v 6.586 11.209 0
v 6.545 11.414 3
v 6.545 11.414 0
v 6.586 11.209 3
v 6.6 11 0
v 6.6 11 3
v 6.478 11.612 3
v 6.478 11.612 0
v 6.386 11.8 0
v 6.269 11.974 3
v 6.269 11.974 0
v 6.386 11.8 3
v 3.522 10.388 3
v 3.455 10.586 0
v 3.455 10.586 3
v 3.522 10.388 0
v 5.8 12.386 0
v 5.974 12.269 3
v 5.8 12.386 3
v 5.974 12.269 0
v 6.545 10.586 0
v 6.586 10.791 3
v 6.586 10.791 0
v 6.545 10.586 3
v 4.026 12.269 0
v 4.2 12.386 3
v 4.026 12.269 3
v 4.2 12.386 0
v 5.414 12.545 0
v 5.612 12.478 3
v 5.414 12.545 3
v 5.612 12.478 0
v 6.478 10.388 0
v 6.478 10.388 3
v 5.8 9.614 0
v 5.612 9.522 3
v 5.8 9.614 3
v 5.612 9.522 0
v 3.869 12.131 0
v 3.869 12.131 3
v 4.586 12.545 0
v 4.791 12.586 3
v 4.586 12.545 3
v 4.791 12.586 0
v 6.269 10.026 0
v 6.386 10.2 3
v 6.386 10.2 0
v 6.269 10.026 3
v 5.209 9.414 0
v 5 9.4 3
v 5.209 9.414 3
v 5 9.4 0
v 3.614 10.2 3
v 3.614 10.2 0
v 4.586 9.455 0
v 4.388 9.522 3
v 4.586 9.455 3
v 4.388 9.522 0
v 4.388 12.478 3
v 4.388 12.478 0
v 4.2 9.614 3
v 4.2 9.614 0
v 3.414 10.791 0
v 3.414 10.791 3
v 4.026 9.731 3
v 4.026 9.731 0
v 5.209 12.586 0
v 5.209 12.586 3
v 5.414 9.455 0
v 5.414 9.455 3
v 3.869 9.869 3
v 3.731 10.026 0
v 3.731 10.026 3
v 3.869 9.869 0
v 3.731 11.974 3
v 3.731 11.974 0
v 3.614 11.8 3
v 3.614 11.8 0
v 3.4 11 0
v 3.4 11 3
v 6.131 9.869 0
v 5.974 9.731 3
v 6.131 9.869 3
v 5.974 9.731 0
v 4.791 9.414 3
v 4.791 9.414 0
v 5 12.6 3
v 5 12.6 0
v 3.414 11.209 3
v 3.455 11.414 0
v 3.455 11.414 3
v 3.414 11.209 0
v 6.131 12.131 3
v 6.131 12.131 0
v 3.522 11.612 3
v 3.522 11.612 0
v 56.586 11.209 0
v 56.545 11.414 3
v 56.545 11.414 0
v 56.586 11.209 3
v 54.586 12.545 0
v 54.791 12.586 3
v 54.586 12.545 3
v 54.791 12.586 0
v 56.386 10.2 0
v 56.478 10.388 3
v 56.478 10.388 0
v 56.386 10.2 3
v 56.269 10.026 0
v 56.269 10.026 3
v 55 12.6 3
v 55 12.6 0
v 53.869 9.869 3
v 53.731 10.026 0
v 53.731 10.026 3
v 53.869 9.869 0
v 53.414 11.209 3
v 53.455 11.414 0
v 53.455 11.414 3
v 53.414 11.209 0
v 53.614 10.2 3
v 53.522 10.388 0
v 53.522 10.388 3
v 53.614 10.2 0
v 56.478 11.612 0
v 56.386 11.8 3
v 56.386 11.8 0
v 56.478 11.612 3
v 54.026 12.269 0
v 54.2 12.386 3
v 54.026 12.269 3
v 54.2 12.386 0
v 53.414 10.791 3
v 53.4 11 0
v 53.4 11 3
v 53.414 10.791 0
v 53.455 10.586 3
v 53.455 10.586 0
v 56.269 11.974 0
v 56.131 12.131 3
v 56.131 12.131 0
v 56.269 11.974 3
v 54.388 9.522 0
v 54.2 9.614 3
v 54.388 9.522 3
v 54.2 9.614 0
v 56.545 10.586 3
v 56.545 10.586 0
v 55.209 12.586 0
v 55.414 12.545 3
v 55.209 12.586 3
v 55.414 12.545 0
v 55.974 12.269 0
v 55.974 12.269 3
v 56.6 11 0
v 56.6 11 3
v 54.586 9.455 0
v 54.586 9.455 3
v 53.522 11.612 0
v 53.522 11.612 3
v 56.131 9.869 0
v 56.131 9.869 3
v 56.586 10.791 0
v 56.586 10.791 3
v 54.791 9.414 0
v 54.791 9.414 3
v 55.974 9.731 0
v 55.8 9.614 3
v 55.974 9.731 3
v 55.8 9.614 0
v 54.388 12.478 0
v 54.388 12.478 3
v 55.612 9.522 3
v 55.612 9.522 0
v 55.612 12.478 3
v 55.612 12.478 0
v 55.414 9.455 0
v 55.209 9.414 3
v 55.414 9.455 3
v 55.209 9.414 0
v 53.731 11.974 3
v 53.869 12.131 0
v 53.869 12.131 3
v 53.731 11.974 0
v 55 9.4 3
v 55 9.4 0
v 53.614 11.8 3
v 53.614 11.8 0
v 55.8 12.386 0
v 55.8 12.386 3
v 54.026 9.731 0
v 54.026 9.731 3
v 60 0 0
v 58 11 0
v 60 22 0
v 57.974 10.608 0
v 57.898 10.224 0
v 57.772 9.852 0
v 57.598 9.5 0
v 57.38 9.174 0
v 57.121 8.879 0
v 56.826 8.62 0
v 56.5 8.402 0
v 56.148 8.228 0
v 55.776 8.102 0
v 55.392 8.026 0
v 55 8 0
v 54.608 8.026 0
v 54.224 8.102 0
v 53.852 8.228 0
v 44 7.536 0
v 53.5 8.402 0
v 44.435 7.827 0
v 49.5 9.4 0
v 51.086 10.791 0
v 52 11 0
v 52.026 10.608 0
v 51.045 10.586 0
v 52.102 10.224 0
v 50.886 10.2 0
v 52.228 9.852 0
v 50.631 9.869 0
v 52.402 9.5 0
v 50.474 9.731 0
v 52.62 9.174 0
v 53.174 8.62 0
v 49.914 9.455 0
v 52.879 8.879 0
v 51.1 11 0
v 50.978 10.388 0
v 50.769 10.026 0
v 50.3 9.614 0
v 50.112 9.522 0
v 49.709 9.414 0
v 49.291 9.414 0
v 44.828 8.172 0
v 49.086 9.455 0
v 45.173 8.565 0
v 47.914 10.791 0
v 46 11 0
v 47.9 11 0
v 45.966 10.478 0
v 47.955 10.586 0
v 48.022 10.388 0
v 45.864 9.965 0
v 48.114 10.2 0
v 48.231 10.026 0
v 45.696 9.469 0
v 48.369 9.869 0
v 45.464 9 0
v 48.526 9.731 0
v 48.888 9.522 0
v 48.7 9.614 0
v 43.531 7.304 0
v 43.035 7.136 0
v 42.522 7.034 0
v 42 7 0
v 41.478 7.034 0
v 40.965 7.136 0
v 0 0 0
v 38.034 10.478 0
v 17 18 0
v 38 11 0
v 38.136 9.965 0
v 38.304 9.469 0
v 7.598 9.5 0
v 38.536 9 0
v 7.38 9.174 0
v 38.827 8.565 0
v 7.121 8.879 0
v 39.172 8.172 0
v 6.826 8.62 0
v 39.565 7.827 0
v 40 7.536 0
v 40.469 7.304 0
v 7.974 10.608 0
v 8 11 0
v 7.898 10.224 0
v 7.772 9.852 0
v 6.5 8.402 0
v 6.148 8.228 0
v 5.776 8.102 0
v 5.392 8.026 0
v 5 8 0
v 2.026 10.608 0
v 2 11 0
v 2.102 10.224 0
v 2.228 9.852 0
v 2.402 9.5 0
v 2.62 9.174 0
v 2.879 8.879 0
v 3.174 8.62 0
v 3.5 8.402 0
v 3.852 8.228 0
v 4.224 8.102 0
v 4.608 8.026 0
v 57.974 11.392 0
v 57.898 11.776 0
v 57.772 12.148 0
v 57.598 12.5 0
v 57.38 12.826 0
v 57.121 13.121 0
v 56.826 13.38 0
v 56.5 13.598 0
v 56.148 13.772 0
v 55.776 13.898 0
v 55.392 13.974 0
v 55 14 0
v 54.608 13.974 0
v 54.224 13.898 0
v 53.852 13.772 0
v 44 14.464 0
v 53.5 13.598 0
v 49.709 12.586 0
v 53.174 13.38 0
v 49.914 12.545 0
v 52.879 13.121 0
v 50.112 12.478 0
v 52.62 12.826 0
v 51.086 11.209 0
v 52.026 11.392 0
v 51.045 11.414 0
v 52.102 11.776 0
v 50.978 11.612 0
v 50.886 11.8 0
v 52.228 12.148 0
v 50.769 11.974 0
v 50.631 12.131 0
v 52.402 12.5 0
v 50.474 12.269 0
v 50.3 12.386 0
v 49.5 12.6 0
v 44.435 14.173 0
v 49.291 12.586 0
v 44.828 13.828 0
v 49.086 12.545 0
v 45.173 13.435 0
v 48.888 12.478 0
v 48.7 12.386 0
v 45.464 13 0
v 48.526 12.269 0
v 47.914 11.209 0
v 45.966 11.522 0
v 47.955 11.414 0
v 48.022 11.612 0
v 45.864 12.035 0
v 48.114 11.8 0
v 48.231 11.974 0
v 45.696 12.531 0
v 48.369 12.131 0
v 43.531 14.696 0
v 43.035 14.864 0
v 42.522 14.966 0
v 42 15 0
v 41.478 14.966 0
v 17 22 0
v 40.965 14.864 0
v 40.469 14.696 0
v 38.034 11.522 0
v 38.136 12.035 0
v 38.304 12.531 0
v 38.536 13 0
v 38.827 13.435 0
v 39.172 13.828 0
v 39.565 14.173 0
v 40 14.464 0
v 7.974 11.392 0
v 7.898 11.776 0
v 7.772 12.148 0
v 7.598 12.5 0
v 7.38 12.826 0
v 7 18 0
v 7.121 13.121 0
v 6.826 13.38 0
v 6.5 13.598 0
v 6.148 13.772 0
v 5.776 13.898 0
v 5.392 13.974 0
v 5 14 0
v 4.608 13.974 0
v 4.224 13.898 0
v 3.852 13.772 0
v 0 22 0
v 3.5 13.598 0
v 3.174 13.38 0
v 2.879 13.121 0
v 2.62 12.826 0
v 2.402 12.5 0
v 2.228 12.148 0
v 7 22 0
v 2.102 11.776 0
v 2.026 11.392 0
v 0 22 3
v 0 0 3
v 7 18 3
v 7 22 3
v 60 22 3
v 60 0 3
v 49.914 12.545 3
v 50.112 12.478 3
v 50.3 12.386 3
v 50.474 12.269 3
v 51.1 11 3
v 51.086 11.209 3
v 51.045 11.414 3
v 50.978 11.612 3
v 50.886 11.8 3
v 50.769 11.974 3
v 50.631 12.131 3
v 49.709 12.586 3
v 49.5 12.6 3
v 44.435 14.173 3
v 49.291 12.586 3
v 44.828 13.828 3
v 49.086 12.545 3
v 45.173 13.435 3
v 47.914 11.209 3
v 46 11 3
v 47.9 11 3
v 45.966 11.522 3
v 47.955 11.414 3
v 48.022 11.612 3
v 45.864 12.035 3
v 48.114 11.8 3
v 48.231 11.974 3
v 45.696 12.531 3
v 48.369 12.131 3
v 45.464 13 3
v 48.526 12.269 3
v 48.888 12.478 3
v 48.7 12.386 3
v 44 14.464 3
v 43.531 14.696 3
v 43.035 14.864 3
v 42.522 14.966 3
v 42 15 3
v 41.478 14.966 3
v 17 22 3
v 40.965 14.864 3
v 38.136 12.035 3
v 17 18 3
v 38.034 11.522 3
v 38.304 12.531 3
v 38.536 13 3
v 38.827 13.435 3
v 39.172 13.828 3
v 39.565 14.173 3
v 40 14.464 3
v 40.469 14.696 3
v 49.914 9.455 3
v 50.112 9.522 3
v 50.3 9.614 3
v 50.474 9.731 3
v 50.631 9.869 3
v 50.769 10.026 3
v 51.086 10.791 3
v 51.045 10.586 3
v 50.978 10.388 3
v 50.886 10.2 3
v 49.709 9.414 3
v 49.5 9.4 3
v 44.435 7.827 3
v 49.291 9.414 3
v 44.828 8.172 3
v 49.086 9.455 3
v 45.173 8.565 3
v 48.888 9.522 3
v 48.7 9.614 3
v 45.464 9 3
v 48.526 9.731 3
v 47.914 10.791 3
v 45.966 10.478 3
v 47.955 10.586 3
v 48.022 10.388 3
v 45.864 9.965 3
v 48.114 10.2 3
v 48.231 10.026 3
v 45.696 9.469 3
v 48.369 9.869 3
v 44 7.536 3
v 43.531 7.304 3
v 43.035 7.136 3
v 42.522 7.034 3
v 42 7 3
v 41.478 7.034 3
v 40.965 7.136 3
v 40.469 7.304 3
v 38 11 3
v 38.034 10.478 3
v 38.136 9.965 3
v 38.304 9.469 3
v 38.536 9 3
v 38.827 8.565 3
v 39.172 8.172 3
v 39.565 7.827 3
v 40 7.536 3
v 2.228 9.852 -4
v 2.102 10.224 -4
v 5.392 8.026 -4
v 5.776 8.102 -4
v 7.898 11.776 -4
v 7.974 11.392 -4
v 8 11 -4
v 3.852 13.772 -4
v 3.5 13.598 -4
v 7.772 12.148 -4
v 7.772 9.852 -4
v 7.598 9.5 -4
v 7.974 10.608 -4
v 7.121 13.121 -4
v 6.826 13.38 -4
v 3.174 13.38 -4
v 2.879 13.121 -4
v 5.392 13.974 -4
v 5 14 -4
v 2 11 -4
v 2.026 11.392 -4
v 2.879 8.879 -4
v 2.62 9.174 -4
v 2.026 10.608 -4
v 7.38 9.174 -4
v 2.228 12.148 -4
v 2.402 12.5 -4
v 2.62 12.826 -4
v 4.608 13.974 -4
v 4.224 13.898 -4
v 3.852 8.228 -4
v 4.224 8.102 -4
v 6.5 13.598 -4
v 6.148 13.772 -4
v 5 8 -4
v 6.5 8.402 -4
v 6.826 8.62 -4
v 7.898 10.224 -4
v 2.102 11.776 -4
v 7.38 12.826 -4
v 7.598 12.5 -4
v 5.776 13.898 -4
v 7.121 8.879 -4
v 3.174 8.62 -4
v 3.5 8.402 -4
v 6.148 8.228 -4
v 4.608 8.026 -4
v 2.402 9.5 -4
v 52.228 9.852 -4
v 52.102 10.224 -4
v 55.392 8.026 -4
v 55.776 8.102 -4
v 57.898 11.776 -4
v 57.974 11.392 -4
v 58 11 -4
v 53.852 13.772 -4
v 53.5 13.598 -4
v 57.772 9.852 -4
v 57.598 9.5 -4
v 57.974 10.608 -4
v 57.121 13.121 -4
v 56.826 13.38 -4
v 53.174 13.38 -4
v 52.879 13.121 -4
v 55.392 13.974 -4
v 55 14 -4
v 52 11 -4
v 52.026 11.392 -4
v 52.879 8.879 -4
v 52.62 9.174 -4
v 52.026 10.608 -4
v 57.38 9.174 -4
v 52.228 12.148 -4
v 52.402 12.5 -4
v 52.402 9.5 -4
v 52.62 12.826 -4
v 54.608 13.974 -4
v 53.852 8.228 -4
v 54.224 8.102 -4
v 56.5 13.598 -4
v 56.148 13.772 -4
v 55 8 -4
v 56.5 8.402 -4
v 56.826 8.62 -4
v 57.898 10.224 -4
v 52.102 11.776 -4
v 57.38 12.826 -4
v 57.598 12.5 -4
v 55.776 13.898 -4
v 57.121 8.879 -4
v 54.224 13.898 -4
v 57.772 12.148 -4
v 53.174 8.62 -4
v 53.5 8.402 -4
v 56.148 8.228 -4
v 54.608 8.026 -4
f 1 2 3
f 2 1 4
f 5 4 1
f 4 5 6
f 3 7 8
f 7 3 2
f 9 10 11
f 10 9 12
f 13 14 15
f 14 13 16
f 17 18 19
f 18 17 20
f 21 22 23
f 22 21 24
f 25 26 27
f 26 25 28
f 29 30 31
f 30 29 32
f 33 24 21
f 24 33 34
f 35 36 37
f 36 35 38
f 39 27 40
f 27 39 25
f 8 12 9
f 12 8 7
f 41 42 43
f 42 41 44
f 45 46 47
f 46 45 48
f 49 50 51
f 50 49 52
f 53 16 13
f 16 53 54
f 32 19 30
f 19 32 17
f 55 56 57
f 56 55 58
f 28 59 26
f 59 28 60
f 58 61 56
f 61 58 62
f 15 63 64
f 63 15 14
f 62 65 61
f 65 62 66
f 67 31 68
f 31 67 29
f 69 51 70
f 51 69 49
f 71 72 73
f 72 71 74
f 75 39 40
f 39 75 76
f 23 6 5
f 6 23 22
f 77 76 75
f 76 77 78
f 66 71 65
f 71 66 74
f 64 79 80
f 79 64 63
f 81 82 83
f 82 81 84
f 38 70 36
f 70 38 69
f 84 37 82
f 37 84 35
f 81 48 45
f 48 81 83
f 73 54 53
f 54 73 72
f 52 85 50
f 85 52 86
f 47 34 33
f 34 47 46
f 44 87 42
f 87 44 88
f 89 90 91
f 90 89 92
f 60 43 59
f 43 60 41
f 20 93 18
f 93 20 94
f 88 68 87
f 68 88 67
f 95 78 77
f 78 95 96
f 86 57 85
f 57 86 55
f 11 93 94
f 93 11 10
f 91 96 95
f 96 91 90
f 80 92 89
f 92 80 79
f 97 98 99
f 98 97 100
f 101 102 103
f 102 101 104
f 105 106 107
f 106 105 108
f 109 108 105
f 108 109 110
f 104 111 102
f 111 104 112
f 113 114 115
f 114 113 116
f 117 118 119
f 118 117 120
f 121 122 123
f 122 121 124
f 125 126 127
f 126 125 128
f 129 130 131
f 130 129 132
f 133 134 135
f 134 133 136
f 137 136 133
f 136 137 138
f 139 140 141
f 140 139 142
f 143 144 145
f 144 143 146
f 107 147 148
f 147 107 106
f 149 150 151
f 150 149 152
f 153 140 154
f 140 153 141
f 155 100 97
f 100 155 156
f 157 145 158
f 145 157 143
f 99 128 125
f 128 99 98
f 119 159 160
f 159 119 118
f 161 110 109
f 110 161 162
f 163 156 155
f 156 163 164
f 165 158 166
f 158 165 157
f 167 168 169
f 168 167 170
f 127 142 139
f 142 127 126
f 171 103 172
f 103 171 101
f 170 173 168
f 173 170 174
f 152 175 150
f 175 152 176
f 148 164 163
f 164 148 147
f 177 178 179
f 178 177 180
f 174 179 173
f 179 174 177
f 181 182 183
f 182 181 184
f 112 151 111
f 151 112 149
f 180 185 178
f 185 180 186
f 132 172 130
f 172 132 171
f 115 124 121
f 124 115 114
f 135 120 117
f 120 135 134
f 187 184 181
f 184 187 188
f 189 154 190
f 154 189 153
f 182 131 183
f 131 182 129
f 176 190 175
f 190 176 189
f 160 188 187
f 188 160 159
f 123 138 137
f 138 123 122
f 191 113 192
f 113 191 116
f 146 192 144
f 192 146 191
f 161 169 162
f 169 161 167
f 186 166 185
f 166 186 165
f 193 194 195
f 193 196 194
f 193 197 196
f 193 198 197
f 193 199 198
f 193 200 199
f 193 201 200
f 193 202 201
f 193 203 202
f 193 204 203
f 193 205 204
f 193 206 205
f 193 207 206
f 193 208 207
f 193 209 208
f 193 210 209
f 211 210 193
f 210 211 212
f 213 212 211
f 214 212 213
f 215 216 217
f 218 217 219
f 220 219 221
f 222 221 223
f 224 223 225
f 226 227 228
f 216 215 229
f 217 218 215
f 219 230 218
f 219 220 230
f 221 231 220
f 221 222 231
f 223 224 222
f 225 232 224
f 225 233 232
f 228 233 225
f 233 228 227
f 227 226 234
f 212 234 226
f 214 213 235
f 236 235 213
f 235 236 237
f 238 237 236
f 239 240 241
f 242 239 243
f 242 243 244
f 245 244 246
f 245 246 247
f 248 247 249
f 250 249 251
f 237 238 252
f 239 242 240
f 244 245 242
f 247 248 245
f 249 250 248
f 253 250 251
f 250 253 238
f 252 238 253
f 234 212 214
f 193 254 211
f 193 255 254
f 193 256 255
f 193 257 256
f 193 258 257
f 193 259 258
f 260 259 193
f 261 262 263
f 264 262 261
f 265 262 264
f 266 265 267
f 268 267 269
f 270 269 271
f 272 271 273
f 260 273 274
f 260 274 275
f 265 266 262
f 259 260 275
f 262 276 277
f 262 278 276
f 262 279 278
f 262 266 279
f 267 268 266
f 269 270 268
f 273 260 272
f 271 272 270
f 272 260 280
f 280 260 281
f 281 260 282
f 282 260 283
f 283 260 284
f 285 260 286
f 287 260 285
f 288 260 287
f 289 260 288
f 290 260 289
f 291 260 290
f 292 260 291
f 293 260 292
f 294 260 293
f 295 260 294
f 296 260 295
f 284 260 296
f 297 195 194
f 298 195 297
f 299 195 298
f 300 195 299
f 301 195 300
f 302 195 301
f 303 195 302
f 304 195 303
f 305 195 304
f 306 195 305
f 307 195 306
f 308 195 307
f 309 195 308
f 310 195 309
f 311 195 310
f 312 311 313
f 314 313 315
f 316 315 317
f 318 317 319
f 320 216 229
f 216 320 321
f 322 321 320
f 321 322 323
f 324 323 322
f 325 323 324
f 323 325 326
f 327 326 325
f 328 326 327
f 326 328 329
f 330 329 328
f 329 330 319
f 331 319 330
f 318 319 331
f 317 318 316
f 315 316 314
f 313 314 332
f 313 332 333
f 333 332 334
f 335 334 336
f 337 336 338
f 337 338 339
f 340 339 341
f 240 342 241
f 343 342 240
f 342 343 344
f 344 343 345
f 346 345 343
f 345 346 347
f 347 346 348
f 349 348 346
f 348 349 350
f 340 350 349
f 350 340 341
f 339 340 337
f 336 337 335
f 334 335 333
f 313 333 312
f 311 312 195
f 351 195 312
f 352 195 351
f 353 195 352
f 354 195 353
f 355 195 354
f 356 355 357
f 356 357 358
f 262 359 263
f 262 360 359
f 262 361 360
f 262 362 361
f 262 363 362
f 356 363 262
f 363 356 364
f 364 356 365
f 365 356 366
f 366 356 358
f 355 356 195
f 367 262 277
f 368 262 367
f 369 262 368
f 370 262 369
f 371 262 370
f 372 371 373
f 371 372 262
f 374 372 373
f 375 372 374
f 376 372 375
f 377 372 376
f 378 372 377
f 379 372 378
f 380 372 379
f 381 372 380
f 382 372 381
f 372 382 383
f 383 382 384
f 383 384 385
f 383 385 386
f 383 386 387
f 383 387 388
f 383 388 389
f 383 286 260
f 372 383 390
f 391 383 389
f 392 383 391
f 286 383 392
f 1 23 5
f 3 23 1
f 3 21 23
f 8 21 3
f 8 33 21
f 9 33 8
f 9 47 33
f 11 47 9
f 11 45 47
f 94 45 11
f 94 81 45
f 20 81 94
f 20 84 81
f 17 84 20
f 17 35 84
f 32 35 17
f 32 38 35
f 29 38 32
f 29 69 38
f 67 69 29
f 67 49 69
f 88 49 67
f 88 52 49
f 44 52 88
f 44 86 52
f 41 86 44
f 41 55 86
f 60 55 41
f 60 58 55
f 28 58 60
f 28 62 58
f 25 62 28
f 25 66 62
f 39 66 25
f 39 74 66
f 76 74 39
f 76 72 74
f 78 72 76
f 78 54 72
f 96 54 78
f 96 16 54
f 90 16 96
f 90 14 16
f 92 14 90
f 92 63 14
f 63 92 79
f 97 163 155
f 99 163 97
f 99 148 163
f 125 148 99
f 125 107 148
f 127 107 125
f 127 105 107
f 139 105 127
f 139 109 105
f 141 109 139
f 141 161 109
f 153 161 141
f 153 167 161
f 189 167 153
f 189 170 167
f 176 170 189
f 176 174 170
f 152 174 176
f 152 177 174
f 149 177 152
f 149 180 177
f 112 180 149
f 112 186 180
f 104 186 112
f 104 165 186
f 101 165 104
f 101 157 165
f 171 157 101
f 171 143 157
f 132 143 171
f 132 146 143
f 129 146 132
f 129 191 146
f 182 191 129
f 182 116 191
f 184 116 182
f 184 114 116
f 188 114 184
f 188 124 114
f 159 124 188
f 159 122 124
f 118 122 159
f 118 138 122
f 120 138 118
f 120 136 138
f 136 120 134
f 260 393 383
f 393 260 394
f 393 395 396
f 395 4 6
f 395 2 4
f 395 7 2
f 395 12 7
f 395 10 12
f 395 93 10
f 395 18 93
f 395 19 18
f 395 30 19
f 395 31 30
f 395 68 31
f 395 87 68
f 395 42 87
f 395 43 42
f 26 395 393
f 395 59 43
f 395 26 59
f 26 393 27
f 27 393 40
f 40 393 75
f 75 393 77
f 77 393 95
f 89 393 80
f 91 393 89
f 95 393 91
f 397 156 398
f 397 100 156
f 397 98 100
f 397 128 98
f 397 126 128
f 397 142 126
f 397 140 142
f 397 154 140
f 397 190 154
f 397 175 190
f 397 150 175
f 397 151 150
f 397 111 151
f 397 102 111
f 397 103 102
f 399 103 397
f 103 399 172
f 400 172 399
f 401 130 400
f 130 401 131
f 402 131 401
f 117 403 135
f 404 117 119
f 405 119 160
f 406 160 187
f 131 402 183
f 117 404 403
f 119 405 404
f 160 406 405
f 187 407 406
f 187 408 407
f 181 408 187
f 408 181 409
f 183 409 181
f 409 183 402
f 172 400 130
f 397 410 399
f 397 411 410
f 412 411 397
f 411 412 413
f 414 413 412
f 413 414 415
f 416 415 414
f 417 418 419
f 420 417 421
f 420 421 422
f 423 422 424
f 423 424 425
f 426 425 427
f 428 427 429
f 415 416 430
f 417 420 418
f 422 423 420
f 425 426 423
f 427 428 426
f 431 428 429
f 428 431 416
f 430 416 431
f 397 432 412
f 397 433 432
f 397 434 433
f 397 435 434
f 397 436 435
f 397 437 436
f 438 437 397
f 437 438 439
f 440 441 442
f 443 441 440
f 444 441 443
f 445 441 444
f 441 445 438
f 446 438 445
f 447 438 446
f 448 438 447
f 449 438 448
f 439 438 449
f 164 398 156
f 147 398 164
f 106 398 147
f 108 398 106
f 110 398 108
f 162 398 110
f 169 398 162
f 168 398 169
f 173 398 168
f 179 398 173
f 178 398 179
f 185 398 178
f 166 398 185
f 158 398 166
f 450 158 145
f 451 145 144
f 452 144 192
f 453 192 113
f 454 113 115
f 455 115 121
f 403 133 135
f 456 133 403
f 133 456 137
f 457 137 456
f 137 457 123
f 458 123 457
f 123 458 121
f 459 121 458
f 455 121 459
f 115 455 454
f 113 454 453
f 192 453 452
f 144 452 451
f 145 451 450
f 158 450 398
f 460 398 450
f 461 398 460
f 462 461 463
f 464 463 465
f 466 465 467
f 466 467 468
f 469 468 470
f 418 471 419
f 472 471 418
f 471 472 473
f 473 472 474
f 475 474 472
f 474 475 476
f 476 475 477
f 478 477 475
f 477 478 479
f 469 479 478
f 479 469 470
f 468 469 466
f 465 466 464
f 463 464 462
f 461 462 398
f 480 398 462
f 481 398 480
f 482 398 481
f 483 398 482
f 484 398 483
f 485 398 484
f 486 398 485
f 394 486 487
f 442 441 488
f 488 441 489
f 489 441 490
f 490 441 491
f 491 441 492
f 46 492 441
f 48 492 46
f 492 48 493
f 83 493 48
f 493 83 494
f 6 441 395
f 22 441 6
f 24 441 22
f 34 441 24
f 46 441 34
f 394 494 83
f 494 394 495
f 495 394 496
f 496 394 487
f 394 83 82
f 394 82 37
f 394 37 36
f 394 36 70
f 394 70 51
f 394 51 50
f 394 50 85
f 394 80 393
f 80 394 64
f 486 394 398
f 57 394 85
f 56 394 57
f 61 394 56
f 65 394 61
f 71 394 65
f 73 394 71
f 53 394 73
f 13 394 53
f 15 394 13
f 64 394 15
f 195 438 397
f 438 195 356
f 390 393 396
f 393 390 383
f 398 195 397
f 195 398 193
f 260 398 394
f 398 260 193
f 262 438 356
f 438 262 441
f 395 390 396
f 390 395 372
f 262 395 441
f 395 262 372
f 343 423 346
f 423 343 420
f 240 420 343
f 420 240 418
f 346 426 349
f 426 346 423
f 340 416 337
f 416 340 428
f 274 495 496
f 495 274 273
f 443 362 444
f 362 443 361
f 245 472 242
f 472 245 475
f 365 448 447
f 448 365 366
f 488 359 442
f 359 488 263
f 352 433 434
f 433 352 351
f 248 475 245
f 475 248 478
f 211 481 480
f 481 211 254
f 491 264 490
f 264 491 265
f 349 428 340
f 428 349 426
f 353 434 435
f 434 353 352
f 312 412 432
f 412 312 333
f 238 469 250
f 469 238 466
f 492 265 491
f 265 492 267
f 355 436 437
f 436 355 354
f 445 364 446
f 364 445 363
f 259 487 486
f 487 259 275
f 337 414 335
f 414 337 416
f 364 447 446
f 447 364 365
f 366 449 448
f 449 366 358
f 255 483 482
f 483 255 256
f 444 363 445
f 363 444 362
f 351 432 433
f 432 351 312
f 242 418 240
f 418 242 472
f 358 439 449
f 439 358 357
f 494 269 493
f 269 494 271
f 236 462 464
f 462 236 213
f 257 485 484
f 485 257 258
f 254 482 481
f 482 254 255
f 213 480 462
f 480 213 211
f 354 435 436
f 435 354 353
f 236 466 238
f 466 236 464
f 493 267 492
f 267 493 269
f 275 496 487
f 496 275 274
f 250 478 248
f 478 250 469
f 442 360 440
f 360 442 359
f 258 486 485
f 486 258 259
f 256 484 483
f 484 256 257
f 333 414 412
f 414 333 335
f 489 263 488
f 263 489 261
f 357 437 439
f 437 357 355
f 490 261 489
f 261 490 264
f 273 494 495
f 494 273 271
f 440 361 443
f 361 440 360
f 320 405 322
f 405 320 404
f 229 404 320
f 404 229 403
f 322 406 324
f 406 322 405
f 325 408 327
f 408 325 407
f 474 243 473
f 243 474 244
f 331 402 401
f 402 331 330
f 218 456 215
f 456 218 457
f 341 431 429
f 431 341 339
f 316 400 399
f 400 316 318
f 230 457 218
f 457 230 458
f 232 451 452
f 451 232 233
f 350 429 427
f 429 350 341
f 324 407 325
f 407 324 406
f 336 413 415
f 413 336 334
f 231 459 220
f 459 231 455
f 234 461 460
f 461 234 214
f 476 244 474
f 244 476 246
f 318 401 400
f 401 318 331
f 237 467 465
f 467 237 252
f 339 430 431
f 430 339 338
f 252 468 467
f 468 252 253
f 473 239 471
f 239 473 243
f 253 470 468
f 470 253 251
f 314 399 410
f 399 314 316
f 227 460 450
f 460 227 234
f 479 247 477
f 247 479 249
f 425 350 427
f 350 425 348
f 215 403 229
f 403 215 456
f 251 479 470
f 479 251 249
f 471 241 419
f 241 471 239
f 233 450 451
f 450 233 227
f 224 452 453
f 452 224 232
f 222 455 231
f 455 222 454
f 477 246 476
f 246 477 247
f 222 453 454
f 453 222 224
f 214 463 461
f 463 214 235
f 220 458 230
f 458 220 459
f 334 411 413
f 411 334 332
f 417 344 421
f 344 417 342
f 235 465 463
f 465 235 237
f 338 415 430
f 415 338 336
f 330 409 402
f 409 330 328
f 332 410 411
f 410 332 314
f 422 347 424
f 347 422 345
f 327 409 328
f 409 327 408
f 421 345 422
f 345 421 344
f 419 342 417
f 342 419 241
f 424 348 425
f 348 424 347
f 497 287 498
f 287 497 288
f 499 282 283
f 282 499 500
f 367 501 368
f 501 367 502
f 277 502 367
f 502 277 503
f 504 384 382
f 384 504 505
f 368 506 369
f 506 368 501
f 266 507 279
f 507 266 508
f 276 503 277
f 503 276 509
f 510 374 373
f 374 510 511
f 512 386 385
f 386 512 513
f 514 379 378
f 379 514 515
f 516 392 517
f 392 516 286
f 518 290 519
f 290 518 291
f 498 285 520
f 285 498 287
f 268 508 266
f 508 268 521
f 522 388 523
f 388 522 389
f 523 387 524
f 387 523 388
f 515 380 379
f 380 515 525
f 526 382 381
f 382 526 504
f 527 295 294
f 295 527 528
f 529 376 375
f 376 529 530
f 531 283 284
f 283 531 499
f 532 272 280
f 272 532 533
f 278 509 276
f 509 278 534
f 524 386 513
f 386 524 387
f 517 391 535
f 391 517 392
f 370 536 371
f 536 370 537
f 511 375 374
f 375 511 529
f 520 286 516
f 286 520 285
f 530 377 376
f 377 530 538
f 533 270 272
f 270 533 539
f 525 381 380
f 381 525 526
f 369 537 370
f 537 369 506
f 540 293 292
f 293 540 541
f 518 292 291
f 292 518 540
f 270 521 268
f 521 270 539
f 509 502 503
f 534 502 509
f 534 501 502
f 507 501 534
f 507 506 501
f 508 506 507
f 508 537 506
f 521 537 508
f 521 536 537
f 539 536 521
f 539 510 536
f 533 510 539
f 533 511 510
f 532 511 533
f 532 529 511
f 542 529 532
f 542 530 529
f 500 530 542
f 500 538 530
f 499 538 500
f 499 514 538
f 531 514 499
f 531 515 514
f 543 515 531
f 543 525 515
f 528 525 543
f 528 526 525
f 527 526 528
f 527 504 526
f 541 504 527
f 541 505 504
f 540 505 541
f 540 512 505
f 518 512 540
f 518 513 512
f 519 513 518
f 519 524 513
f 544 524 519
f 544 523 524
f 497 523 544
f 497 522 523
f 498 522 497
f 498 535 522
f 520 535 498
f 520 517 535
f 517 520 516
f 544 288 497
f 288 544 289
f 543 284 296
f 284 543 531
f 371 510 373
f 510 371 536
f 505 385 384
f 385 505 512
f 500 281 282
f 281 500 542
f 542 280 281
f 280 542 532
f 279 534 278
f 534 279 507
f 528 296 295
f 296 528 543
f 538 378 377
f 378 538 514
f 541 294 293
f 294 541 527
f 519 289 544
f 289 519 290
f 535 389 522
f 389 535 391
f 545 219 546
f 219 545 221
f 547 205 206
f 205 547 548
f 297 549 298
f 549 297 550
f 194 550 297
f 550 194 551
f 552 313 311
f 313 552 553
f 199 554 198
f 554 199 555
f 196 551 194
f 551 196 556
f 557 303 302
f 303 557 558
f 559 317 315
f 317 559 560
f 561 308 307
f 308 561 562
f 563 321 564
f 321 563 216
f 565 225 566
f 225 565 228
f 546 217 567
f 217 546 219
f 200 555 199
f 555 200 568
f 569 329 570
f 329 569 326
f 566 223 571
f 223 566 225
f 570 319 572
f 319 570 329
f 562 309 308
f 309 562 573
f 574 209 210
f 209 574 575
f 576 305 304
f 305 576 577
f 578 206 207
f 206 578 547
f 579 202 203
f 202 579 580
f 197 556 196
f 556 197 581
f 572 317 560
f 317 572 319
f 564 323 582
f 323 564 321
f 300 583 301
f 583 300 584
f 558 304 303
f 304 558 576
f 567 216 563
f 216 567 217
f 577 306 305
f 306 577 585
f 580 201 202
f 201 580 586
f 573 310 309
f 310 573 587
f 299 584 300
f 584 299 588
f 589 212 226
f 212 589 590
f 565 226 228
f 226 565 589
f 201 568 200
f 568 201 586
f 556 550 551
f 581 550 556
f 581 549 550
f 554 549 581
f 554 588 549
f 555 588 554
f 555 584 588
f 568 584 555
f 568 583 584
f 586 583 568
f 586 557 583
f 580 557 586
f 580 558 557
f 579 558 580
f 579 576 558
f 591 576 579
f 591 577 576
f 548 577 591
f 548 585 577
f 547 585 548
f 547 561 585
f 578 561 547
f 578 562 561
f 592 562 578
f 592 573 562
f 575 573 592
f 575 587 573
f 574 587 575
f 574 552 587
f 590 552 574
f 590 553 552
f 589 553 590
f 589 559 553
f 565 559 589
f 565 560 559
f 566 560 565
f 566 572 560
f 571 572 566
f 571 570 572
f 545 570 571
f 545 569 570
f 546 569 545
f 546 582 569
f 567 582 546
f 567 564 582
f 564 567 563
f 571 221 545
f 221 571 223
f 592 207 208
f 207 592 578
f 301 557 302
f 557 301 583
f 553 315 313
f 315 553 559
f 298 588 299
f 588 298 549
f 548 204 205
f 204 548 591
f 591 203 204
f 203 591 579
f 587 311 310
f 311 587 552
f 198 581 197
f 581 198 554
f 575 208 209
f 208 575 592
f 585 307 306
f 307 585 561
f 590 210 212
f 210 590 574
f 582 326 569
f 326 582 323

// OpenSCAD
// SITE-R 7372 - sensor mounting bracket
// OpenSCAD source for the clip that holds the DHT11 and the LDR inside the
// glass enclosure. Print at 0.2mm layer height, 4 perimeters, 20% infill.
//
// Render:  openscad -o bracket.stl enclosure_bracket.scad
// Edit:    change PLATE_W / DEPTH / slot positions, re-render.

$fn = 48;

// --- overall plate ---
PLATE_W   = 60;   // mm, width of the mounting plate
PLATE_D   = 22;   // mm, depth of the plate
PLATE_T   = 3;    // mm, plate thickness
HOLE_D    = 3.2;  // mm, screw clearance
HOLE_INSET= 5;    // mm, distance from plate edge to screw hole centre

// --- sensor slots ---
SLOT_W    = 10;   // mm, DHT11 body width
SLOT_H    = 16;   // mm, DHT11 body height
SLOT_D    = 4;    // mm, how deep the slot is cut into the plate
DHT_X     = 12;   // mm, slot centre from left edge
DHT_HOLE_D= 2.6;  // mm, mounting hole through the slot

// LDR opening: a round window so light still reaches the photoresistor
LDR_X     = 42;   // mm, window centre from left edge
LDR_D     = 8;    // mm, window diameter
LDR_HOLE_D= 3.2;

module plate() {
    difference() {
        // the plate itself
        translate([0, 0, 0])
            linear_extrude(height = PLATE_T)
                square([PLATE_W, PLATE_D], center = false);

        // two screw holes, one per end
        for (x = [HOLE_INSET, PLATE_W - HOLE_INSET])
            translate([x, PLATE_D / 2, -1])
                cylinder(h = PLATE_T + 2, d = HOLE_D);

        // DHT11 slot (cut from the top edge downwards)
        translate([DHT_X - SLOT_W / 2, PLATE_D - SLOT_D, -1])
            cube([SLOT_W, SLOT_D + 1, PLATE_T + 2]);

        // screw hole down the middle of the DHT11 slot
        translate([DHT_X, PLATE_D - SLOT_D / 2, -1])
            cylinder(h = PLATE_T + 2, d = DHT_HOLE_D);

        // LDR light window
        translate([LDR_X, PLATE_D / 2, -1])
            cylinder(h = PLATE_T + 2, d = LDR_D);

        // screw hole beside the LDR
        translate([LDR_X + LDR_D / 2 + 3.5, PLATE_D / 2, -1])
            cylinder(h = PLATE_T + 2, d = LDR_HOLE_D);
    }
}

// small feet so the bracket stands off the enclosure floor
module feet() {
    for (x = [HOLE_INSET, PLATE_W - HOLE_INSET])
        translate([x, PLATE_D / 2, -4])
            cylinder(h = 4, d = 6);
}

module bracket() {
    difference() {
        union() {
            plate();
            feet();
        }
    }
}

bracket();
